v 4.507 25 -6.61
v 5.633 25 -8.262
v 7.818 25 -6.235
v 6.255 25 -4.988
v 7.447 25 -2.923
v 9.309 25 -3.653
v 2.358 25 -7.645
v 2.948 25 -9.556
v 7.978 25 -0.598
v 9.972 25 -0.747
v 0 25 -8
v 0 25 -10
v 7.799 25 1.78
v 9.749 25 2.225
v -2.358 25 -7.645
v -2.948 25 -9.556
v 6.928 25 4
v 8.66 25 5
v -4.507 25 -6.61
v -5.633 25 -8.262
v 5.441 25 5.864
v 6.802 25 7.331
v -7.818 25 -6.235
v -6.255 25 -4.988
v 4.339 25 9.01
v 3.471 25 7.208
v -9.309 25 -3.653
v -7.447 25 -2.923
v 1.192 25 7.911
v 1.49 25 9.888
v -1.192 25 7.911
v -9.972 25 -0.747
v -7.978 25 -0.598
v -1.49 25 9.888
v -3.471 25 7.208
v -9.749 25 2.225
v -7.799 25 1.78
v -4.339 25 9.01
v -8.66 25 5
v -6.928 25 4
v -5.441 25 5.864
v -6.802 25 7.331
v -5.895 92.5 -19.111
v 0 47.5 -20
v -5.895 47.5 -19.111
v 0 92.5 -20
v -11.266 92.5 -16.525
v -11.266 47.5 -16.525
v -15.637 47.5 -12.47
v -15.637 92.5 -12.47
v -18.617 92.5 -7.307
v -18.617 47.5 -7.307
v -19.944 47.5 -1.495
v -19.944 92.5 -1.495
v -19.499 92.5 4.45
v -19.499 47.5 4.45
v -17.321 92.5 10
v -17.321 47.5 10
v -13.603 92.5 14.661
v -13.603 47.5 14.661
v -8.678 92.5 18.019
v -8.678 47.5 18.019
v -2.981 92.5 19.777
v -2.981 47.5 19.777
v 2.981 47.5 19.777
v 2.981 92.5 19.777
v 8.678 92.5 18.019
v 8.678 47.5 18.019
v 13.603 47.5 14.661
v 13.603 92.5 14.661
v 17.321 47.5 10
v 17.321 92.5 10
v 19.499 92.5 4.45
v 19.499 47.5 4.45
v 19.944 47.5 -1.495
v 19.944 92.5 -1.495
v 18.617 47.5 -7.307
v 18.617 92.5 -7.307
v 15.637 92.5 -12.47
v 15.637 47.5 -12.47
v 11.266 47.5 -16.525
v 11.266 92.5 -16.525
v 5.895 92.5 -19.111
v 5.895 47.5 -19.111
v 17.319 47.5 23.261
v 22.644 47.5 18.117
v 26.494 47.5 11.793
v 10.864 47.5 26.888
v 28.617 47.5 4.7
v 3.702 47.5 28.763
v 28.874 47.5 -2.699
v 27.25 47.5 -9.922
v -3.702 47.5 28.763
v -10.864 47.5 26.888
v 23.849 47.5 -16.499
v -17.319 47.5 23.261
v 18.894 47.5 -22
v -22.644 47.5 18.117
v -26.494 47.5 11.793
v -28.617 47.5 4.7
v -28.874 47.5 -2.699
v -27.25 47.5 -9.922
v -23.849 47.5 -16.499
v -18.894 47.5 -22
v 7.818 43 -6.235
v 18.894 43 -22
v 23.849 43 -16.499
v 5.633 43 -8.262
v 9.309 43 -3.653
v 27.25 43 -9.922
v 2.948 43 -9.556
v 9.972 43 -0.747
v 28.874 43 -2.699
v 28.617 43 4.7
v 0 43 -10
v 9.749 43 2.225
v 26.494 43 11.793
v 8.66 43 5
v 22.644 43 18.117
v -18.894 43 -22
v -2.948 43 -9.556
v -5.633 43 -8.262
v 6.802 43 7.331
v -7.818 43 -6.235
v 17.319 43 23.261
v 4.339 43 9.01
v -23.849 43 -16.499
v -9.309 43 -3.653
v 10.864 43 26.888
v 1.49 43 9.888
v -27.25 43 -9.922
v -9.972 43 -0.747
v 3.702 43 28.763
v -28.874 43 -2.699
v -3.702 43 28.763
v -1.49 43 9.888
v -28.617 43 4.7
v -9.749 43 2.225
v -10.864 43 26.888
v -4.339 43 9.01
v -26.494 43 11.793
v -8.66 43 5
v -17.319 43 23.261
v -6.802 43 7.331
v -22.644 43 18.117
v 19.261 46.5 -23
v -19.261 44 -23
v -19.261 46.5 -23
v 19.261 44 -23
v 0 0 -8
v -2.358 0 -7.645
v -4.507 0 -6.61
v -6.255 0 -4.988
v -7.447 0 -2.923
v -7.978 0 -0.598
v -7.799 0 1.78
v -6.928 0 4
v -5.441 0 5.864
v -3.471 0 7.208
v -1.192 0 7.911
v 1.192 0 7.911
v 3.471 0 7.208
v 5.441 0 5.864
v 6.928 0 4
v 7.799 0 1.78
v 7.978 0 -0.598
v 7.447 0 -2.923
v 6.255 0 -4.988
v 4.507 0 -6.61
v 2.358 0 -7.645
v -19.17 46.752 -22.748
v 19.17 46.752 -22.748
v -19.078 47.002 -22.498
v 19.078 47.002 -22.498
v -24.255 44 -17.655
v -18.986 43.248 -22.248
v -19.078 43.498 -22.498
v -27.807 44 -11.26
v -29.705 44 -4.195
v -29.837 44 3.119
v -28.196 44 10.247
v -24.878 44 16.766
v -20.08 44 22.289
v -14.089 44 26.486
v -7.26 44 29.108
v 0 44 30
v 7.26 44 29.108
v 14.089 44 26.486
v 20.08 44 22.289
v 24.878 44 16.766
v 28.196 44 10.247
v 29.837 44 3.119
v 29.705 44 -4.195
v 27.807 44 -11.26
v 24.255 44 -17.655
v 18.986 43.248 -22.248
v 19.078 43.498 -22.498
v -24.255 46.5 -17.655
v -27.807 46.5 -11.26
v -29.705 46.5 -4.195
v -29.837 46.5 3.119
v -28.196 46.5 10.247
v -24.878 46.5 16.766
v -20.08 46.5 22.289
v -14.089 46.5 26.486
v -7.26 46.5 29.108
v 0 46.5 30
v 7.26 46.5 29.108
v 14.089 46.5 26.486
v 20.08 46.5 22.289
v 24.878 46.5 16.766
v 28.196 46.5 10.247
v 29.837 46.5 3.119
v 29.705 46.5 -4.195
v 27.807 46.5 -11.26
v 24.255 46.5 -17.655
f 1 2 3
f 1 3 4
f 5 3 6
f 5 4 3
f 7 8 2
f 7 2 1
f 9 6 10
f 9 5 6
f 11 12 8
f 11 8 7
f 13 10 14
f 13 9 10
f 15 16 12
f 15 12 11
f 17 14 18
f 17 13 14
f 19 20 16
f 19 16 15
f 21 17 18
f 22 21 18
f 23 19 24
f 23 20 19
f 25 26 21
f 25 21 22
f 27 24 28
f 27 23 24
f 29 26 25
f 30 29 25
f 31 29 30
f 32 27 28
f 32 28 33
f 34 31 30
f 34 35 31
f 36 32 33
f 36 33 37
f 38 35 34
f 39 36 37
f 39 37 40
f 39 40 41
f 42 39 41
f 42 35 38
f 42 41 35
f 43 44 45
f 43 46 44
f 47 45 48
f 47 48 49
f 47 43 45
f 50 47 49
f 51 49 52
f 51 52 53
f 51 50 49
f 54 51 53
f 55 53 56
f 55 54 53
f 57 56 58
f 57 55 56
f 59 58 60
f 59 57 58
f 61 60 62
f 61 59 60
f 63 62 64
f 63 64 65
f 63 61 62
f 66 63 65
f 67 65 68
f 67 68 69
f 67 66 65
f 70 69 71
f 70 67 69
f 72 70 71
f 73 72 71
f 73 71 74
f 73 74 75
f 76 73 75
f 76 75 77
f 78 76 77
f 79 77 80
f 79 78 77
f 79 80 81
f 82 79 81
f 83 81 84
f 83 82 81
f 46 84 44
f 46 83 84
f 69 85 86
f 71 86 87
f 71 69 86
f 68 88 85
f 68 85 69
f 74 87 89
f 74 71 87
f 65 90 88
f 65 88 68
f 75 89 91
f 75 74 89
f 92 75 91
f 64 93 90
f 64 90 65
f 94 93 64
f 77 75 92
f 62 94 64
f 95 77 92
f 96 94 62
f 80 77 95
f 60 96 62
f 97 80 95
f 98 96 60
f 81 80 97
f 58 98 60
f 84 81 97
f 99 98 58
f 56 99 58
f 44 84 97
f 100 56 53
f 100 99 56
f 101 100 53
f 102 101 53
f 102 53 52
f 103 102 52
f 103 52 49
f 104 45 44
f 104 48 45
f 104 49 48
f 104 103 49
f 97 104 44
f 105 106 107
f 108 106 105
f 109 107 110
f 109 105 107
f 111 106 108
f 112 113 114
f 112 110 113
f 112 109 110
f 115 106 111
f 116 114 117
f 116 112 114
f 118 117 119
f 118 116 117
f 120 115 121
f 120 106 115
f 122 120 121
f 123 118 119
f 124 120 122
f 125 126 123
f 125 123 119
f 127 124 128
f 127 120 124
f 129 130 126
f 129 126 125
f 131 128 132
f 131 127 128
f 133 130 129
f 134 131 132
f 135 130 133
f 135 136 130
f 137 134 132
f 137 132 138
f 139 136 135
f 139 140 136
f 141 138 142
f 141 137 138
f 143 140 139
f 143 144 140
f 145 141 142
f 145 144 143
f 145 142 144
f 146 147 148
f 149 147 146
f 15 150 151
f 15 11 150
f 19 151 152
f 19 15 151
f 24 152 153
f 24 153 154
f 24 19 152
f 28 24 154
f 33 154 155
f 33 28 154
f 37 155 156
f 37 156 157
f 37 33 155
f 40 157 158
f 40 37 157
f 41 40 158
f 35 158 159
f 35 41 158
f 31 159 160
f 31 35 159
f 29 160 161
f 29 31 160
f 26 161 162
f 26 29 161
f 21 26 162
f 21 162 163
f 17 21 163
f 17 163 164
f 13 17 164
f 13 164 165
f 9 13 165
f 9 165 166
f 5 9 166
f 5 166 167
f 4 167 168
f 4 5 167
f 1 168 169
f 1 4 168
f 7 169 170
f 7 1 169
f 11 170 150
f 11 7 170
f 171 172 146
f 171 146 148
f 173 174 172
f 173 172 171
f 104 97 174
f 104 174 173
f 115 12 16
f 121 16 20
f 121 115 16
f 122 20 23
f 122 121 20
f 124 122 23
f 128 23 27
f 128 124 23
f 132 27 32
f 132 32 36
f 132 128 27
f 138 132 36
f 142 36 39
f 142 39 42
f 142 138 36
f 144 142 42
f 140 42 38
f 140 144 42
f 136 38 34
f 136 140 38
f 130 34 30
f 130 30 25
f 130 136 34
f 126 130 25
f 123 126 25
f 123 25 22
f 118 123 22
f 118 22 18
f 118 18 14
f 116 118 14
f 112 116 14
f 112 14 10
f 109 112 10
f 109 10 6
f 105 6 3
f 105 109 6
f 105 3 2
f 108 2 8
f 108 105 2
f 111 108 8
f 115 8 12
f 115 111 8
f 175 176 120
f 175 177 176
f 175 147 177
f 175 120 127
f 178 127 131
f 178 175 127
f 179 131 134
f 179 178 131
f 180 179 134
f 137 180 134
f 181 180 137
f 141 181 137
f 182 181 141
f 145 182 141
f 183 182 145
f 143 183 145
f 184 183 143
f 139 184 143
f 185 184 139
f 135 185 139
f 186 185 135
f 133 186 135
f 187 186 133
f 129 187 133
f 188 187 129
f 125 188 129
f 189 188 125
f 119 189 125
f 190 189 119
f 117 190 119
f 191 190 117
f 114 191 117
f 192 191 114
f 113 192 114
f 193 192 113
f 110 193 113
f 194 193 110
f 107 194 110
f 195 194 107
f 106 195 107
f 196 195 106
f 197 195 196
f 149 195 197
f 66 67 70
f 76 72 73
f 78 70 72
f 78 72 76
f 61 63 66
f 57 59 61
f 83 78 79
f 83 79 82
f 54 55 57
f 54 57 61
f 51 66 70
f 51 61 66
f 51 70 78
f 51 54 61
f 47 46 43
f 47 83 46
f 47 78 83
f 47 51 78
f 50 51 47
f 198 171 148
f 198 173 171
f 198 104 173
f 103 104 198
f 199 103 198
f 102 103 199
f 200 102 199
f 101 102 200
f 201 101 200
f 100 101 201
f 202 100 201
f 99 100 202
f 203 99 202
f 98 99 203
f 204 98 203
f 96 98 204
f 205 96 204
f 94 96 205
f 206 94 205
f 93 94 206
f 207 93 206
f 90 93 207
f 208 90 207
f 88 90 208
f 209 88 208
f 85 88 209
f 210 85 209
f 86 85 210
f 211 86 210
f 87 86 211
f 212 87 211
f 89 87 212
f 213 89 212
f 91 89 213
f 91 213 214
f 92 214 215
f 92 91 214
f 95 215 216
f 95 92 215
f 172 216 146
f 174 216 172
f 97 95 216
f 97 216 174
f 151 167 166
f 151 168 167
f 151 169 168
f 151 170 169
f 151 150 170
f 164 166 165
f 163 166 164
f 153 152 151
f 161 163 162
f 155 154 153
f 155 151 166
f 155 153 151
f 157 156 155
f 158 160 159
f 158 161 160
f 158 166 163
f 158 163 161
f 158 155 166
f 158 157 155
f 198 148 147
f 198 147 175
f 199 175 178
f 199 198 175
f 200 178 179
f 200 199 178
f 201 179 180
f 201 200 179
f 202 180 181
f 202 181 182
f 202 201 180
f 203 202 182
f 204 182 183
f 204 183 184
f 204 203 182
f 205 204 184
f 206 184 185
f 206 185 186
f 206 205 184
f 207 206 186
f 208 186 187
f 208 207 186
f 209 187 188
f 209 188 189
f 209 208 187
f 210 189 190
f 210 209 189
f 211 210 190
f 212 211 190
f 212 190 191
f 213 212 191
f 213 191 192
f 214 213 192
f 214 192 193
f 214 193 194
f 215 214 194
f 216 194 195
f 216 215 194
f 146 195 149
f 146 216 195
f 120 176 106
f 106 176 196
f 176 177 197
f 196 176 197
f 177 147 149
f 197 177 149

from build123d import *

# Parameters (mm, degrees)
F2_W     = 60
F2_H     = 10
F3_DEPTH = 92.501
F4_SIZE  = 1


with BuildPart() as f1:
    # F0 (on Right) → F1 (revolve)
    with BuildSketch(Plane.YZ):
        Polygon((92.5, 0), (0, 0), (0, -8), (25, -8), (25, -10), (43, -10), (43, -30), (47.5, -30), (47.5, -20), (92.5, -20), align=None)
    revolve(axis=Axis((0, 37.79896, 0), (0, 1, 0)))

    # F2 (on Front) → F3 (cut, through all)
    with BuildSketch(Plane.XZ):
        with Locations((0, -28)):
            Rectangle(F2_W, F2_H)
    extrude(amount=-F3_DEPTH, mode=Mode.SUBTRACT)

    # F4
    f4_edges = [f1.edges().sort_by_distance(p)[0] for p in [
        (0, 47.5, 30),
        (0, 47.5, -23),
        (0, 43, 30),
        (0, 43, -23),
    ]]
    chamfer(f4_edges, length=F4_SIZE)


solid = f1.part
